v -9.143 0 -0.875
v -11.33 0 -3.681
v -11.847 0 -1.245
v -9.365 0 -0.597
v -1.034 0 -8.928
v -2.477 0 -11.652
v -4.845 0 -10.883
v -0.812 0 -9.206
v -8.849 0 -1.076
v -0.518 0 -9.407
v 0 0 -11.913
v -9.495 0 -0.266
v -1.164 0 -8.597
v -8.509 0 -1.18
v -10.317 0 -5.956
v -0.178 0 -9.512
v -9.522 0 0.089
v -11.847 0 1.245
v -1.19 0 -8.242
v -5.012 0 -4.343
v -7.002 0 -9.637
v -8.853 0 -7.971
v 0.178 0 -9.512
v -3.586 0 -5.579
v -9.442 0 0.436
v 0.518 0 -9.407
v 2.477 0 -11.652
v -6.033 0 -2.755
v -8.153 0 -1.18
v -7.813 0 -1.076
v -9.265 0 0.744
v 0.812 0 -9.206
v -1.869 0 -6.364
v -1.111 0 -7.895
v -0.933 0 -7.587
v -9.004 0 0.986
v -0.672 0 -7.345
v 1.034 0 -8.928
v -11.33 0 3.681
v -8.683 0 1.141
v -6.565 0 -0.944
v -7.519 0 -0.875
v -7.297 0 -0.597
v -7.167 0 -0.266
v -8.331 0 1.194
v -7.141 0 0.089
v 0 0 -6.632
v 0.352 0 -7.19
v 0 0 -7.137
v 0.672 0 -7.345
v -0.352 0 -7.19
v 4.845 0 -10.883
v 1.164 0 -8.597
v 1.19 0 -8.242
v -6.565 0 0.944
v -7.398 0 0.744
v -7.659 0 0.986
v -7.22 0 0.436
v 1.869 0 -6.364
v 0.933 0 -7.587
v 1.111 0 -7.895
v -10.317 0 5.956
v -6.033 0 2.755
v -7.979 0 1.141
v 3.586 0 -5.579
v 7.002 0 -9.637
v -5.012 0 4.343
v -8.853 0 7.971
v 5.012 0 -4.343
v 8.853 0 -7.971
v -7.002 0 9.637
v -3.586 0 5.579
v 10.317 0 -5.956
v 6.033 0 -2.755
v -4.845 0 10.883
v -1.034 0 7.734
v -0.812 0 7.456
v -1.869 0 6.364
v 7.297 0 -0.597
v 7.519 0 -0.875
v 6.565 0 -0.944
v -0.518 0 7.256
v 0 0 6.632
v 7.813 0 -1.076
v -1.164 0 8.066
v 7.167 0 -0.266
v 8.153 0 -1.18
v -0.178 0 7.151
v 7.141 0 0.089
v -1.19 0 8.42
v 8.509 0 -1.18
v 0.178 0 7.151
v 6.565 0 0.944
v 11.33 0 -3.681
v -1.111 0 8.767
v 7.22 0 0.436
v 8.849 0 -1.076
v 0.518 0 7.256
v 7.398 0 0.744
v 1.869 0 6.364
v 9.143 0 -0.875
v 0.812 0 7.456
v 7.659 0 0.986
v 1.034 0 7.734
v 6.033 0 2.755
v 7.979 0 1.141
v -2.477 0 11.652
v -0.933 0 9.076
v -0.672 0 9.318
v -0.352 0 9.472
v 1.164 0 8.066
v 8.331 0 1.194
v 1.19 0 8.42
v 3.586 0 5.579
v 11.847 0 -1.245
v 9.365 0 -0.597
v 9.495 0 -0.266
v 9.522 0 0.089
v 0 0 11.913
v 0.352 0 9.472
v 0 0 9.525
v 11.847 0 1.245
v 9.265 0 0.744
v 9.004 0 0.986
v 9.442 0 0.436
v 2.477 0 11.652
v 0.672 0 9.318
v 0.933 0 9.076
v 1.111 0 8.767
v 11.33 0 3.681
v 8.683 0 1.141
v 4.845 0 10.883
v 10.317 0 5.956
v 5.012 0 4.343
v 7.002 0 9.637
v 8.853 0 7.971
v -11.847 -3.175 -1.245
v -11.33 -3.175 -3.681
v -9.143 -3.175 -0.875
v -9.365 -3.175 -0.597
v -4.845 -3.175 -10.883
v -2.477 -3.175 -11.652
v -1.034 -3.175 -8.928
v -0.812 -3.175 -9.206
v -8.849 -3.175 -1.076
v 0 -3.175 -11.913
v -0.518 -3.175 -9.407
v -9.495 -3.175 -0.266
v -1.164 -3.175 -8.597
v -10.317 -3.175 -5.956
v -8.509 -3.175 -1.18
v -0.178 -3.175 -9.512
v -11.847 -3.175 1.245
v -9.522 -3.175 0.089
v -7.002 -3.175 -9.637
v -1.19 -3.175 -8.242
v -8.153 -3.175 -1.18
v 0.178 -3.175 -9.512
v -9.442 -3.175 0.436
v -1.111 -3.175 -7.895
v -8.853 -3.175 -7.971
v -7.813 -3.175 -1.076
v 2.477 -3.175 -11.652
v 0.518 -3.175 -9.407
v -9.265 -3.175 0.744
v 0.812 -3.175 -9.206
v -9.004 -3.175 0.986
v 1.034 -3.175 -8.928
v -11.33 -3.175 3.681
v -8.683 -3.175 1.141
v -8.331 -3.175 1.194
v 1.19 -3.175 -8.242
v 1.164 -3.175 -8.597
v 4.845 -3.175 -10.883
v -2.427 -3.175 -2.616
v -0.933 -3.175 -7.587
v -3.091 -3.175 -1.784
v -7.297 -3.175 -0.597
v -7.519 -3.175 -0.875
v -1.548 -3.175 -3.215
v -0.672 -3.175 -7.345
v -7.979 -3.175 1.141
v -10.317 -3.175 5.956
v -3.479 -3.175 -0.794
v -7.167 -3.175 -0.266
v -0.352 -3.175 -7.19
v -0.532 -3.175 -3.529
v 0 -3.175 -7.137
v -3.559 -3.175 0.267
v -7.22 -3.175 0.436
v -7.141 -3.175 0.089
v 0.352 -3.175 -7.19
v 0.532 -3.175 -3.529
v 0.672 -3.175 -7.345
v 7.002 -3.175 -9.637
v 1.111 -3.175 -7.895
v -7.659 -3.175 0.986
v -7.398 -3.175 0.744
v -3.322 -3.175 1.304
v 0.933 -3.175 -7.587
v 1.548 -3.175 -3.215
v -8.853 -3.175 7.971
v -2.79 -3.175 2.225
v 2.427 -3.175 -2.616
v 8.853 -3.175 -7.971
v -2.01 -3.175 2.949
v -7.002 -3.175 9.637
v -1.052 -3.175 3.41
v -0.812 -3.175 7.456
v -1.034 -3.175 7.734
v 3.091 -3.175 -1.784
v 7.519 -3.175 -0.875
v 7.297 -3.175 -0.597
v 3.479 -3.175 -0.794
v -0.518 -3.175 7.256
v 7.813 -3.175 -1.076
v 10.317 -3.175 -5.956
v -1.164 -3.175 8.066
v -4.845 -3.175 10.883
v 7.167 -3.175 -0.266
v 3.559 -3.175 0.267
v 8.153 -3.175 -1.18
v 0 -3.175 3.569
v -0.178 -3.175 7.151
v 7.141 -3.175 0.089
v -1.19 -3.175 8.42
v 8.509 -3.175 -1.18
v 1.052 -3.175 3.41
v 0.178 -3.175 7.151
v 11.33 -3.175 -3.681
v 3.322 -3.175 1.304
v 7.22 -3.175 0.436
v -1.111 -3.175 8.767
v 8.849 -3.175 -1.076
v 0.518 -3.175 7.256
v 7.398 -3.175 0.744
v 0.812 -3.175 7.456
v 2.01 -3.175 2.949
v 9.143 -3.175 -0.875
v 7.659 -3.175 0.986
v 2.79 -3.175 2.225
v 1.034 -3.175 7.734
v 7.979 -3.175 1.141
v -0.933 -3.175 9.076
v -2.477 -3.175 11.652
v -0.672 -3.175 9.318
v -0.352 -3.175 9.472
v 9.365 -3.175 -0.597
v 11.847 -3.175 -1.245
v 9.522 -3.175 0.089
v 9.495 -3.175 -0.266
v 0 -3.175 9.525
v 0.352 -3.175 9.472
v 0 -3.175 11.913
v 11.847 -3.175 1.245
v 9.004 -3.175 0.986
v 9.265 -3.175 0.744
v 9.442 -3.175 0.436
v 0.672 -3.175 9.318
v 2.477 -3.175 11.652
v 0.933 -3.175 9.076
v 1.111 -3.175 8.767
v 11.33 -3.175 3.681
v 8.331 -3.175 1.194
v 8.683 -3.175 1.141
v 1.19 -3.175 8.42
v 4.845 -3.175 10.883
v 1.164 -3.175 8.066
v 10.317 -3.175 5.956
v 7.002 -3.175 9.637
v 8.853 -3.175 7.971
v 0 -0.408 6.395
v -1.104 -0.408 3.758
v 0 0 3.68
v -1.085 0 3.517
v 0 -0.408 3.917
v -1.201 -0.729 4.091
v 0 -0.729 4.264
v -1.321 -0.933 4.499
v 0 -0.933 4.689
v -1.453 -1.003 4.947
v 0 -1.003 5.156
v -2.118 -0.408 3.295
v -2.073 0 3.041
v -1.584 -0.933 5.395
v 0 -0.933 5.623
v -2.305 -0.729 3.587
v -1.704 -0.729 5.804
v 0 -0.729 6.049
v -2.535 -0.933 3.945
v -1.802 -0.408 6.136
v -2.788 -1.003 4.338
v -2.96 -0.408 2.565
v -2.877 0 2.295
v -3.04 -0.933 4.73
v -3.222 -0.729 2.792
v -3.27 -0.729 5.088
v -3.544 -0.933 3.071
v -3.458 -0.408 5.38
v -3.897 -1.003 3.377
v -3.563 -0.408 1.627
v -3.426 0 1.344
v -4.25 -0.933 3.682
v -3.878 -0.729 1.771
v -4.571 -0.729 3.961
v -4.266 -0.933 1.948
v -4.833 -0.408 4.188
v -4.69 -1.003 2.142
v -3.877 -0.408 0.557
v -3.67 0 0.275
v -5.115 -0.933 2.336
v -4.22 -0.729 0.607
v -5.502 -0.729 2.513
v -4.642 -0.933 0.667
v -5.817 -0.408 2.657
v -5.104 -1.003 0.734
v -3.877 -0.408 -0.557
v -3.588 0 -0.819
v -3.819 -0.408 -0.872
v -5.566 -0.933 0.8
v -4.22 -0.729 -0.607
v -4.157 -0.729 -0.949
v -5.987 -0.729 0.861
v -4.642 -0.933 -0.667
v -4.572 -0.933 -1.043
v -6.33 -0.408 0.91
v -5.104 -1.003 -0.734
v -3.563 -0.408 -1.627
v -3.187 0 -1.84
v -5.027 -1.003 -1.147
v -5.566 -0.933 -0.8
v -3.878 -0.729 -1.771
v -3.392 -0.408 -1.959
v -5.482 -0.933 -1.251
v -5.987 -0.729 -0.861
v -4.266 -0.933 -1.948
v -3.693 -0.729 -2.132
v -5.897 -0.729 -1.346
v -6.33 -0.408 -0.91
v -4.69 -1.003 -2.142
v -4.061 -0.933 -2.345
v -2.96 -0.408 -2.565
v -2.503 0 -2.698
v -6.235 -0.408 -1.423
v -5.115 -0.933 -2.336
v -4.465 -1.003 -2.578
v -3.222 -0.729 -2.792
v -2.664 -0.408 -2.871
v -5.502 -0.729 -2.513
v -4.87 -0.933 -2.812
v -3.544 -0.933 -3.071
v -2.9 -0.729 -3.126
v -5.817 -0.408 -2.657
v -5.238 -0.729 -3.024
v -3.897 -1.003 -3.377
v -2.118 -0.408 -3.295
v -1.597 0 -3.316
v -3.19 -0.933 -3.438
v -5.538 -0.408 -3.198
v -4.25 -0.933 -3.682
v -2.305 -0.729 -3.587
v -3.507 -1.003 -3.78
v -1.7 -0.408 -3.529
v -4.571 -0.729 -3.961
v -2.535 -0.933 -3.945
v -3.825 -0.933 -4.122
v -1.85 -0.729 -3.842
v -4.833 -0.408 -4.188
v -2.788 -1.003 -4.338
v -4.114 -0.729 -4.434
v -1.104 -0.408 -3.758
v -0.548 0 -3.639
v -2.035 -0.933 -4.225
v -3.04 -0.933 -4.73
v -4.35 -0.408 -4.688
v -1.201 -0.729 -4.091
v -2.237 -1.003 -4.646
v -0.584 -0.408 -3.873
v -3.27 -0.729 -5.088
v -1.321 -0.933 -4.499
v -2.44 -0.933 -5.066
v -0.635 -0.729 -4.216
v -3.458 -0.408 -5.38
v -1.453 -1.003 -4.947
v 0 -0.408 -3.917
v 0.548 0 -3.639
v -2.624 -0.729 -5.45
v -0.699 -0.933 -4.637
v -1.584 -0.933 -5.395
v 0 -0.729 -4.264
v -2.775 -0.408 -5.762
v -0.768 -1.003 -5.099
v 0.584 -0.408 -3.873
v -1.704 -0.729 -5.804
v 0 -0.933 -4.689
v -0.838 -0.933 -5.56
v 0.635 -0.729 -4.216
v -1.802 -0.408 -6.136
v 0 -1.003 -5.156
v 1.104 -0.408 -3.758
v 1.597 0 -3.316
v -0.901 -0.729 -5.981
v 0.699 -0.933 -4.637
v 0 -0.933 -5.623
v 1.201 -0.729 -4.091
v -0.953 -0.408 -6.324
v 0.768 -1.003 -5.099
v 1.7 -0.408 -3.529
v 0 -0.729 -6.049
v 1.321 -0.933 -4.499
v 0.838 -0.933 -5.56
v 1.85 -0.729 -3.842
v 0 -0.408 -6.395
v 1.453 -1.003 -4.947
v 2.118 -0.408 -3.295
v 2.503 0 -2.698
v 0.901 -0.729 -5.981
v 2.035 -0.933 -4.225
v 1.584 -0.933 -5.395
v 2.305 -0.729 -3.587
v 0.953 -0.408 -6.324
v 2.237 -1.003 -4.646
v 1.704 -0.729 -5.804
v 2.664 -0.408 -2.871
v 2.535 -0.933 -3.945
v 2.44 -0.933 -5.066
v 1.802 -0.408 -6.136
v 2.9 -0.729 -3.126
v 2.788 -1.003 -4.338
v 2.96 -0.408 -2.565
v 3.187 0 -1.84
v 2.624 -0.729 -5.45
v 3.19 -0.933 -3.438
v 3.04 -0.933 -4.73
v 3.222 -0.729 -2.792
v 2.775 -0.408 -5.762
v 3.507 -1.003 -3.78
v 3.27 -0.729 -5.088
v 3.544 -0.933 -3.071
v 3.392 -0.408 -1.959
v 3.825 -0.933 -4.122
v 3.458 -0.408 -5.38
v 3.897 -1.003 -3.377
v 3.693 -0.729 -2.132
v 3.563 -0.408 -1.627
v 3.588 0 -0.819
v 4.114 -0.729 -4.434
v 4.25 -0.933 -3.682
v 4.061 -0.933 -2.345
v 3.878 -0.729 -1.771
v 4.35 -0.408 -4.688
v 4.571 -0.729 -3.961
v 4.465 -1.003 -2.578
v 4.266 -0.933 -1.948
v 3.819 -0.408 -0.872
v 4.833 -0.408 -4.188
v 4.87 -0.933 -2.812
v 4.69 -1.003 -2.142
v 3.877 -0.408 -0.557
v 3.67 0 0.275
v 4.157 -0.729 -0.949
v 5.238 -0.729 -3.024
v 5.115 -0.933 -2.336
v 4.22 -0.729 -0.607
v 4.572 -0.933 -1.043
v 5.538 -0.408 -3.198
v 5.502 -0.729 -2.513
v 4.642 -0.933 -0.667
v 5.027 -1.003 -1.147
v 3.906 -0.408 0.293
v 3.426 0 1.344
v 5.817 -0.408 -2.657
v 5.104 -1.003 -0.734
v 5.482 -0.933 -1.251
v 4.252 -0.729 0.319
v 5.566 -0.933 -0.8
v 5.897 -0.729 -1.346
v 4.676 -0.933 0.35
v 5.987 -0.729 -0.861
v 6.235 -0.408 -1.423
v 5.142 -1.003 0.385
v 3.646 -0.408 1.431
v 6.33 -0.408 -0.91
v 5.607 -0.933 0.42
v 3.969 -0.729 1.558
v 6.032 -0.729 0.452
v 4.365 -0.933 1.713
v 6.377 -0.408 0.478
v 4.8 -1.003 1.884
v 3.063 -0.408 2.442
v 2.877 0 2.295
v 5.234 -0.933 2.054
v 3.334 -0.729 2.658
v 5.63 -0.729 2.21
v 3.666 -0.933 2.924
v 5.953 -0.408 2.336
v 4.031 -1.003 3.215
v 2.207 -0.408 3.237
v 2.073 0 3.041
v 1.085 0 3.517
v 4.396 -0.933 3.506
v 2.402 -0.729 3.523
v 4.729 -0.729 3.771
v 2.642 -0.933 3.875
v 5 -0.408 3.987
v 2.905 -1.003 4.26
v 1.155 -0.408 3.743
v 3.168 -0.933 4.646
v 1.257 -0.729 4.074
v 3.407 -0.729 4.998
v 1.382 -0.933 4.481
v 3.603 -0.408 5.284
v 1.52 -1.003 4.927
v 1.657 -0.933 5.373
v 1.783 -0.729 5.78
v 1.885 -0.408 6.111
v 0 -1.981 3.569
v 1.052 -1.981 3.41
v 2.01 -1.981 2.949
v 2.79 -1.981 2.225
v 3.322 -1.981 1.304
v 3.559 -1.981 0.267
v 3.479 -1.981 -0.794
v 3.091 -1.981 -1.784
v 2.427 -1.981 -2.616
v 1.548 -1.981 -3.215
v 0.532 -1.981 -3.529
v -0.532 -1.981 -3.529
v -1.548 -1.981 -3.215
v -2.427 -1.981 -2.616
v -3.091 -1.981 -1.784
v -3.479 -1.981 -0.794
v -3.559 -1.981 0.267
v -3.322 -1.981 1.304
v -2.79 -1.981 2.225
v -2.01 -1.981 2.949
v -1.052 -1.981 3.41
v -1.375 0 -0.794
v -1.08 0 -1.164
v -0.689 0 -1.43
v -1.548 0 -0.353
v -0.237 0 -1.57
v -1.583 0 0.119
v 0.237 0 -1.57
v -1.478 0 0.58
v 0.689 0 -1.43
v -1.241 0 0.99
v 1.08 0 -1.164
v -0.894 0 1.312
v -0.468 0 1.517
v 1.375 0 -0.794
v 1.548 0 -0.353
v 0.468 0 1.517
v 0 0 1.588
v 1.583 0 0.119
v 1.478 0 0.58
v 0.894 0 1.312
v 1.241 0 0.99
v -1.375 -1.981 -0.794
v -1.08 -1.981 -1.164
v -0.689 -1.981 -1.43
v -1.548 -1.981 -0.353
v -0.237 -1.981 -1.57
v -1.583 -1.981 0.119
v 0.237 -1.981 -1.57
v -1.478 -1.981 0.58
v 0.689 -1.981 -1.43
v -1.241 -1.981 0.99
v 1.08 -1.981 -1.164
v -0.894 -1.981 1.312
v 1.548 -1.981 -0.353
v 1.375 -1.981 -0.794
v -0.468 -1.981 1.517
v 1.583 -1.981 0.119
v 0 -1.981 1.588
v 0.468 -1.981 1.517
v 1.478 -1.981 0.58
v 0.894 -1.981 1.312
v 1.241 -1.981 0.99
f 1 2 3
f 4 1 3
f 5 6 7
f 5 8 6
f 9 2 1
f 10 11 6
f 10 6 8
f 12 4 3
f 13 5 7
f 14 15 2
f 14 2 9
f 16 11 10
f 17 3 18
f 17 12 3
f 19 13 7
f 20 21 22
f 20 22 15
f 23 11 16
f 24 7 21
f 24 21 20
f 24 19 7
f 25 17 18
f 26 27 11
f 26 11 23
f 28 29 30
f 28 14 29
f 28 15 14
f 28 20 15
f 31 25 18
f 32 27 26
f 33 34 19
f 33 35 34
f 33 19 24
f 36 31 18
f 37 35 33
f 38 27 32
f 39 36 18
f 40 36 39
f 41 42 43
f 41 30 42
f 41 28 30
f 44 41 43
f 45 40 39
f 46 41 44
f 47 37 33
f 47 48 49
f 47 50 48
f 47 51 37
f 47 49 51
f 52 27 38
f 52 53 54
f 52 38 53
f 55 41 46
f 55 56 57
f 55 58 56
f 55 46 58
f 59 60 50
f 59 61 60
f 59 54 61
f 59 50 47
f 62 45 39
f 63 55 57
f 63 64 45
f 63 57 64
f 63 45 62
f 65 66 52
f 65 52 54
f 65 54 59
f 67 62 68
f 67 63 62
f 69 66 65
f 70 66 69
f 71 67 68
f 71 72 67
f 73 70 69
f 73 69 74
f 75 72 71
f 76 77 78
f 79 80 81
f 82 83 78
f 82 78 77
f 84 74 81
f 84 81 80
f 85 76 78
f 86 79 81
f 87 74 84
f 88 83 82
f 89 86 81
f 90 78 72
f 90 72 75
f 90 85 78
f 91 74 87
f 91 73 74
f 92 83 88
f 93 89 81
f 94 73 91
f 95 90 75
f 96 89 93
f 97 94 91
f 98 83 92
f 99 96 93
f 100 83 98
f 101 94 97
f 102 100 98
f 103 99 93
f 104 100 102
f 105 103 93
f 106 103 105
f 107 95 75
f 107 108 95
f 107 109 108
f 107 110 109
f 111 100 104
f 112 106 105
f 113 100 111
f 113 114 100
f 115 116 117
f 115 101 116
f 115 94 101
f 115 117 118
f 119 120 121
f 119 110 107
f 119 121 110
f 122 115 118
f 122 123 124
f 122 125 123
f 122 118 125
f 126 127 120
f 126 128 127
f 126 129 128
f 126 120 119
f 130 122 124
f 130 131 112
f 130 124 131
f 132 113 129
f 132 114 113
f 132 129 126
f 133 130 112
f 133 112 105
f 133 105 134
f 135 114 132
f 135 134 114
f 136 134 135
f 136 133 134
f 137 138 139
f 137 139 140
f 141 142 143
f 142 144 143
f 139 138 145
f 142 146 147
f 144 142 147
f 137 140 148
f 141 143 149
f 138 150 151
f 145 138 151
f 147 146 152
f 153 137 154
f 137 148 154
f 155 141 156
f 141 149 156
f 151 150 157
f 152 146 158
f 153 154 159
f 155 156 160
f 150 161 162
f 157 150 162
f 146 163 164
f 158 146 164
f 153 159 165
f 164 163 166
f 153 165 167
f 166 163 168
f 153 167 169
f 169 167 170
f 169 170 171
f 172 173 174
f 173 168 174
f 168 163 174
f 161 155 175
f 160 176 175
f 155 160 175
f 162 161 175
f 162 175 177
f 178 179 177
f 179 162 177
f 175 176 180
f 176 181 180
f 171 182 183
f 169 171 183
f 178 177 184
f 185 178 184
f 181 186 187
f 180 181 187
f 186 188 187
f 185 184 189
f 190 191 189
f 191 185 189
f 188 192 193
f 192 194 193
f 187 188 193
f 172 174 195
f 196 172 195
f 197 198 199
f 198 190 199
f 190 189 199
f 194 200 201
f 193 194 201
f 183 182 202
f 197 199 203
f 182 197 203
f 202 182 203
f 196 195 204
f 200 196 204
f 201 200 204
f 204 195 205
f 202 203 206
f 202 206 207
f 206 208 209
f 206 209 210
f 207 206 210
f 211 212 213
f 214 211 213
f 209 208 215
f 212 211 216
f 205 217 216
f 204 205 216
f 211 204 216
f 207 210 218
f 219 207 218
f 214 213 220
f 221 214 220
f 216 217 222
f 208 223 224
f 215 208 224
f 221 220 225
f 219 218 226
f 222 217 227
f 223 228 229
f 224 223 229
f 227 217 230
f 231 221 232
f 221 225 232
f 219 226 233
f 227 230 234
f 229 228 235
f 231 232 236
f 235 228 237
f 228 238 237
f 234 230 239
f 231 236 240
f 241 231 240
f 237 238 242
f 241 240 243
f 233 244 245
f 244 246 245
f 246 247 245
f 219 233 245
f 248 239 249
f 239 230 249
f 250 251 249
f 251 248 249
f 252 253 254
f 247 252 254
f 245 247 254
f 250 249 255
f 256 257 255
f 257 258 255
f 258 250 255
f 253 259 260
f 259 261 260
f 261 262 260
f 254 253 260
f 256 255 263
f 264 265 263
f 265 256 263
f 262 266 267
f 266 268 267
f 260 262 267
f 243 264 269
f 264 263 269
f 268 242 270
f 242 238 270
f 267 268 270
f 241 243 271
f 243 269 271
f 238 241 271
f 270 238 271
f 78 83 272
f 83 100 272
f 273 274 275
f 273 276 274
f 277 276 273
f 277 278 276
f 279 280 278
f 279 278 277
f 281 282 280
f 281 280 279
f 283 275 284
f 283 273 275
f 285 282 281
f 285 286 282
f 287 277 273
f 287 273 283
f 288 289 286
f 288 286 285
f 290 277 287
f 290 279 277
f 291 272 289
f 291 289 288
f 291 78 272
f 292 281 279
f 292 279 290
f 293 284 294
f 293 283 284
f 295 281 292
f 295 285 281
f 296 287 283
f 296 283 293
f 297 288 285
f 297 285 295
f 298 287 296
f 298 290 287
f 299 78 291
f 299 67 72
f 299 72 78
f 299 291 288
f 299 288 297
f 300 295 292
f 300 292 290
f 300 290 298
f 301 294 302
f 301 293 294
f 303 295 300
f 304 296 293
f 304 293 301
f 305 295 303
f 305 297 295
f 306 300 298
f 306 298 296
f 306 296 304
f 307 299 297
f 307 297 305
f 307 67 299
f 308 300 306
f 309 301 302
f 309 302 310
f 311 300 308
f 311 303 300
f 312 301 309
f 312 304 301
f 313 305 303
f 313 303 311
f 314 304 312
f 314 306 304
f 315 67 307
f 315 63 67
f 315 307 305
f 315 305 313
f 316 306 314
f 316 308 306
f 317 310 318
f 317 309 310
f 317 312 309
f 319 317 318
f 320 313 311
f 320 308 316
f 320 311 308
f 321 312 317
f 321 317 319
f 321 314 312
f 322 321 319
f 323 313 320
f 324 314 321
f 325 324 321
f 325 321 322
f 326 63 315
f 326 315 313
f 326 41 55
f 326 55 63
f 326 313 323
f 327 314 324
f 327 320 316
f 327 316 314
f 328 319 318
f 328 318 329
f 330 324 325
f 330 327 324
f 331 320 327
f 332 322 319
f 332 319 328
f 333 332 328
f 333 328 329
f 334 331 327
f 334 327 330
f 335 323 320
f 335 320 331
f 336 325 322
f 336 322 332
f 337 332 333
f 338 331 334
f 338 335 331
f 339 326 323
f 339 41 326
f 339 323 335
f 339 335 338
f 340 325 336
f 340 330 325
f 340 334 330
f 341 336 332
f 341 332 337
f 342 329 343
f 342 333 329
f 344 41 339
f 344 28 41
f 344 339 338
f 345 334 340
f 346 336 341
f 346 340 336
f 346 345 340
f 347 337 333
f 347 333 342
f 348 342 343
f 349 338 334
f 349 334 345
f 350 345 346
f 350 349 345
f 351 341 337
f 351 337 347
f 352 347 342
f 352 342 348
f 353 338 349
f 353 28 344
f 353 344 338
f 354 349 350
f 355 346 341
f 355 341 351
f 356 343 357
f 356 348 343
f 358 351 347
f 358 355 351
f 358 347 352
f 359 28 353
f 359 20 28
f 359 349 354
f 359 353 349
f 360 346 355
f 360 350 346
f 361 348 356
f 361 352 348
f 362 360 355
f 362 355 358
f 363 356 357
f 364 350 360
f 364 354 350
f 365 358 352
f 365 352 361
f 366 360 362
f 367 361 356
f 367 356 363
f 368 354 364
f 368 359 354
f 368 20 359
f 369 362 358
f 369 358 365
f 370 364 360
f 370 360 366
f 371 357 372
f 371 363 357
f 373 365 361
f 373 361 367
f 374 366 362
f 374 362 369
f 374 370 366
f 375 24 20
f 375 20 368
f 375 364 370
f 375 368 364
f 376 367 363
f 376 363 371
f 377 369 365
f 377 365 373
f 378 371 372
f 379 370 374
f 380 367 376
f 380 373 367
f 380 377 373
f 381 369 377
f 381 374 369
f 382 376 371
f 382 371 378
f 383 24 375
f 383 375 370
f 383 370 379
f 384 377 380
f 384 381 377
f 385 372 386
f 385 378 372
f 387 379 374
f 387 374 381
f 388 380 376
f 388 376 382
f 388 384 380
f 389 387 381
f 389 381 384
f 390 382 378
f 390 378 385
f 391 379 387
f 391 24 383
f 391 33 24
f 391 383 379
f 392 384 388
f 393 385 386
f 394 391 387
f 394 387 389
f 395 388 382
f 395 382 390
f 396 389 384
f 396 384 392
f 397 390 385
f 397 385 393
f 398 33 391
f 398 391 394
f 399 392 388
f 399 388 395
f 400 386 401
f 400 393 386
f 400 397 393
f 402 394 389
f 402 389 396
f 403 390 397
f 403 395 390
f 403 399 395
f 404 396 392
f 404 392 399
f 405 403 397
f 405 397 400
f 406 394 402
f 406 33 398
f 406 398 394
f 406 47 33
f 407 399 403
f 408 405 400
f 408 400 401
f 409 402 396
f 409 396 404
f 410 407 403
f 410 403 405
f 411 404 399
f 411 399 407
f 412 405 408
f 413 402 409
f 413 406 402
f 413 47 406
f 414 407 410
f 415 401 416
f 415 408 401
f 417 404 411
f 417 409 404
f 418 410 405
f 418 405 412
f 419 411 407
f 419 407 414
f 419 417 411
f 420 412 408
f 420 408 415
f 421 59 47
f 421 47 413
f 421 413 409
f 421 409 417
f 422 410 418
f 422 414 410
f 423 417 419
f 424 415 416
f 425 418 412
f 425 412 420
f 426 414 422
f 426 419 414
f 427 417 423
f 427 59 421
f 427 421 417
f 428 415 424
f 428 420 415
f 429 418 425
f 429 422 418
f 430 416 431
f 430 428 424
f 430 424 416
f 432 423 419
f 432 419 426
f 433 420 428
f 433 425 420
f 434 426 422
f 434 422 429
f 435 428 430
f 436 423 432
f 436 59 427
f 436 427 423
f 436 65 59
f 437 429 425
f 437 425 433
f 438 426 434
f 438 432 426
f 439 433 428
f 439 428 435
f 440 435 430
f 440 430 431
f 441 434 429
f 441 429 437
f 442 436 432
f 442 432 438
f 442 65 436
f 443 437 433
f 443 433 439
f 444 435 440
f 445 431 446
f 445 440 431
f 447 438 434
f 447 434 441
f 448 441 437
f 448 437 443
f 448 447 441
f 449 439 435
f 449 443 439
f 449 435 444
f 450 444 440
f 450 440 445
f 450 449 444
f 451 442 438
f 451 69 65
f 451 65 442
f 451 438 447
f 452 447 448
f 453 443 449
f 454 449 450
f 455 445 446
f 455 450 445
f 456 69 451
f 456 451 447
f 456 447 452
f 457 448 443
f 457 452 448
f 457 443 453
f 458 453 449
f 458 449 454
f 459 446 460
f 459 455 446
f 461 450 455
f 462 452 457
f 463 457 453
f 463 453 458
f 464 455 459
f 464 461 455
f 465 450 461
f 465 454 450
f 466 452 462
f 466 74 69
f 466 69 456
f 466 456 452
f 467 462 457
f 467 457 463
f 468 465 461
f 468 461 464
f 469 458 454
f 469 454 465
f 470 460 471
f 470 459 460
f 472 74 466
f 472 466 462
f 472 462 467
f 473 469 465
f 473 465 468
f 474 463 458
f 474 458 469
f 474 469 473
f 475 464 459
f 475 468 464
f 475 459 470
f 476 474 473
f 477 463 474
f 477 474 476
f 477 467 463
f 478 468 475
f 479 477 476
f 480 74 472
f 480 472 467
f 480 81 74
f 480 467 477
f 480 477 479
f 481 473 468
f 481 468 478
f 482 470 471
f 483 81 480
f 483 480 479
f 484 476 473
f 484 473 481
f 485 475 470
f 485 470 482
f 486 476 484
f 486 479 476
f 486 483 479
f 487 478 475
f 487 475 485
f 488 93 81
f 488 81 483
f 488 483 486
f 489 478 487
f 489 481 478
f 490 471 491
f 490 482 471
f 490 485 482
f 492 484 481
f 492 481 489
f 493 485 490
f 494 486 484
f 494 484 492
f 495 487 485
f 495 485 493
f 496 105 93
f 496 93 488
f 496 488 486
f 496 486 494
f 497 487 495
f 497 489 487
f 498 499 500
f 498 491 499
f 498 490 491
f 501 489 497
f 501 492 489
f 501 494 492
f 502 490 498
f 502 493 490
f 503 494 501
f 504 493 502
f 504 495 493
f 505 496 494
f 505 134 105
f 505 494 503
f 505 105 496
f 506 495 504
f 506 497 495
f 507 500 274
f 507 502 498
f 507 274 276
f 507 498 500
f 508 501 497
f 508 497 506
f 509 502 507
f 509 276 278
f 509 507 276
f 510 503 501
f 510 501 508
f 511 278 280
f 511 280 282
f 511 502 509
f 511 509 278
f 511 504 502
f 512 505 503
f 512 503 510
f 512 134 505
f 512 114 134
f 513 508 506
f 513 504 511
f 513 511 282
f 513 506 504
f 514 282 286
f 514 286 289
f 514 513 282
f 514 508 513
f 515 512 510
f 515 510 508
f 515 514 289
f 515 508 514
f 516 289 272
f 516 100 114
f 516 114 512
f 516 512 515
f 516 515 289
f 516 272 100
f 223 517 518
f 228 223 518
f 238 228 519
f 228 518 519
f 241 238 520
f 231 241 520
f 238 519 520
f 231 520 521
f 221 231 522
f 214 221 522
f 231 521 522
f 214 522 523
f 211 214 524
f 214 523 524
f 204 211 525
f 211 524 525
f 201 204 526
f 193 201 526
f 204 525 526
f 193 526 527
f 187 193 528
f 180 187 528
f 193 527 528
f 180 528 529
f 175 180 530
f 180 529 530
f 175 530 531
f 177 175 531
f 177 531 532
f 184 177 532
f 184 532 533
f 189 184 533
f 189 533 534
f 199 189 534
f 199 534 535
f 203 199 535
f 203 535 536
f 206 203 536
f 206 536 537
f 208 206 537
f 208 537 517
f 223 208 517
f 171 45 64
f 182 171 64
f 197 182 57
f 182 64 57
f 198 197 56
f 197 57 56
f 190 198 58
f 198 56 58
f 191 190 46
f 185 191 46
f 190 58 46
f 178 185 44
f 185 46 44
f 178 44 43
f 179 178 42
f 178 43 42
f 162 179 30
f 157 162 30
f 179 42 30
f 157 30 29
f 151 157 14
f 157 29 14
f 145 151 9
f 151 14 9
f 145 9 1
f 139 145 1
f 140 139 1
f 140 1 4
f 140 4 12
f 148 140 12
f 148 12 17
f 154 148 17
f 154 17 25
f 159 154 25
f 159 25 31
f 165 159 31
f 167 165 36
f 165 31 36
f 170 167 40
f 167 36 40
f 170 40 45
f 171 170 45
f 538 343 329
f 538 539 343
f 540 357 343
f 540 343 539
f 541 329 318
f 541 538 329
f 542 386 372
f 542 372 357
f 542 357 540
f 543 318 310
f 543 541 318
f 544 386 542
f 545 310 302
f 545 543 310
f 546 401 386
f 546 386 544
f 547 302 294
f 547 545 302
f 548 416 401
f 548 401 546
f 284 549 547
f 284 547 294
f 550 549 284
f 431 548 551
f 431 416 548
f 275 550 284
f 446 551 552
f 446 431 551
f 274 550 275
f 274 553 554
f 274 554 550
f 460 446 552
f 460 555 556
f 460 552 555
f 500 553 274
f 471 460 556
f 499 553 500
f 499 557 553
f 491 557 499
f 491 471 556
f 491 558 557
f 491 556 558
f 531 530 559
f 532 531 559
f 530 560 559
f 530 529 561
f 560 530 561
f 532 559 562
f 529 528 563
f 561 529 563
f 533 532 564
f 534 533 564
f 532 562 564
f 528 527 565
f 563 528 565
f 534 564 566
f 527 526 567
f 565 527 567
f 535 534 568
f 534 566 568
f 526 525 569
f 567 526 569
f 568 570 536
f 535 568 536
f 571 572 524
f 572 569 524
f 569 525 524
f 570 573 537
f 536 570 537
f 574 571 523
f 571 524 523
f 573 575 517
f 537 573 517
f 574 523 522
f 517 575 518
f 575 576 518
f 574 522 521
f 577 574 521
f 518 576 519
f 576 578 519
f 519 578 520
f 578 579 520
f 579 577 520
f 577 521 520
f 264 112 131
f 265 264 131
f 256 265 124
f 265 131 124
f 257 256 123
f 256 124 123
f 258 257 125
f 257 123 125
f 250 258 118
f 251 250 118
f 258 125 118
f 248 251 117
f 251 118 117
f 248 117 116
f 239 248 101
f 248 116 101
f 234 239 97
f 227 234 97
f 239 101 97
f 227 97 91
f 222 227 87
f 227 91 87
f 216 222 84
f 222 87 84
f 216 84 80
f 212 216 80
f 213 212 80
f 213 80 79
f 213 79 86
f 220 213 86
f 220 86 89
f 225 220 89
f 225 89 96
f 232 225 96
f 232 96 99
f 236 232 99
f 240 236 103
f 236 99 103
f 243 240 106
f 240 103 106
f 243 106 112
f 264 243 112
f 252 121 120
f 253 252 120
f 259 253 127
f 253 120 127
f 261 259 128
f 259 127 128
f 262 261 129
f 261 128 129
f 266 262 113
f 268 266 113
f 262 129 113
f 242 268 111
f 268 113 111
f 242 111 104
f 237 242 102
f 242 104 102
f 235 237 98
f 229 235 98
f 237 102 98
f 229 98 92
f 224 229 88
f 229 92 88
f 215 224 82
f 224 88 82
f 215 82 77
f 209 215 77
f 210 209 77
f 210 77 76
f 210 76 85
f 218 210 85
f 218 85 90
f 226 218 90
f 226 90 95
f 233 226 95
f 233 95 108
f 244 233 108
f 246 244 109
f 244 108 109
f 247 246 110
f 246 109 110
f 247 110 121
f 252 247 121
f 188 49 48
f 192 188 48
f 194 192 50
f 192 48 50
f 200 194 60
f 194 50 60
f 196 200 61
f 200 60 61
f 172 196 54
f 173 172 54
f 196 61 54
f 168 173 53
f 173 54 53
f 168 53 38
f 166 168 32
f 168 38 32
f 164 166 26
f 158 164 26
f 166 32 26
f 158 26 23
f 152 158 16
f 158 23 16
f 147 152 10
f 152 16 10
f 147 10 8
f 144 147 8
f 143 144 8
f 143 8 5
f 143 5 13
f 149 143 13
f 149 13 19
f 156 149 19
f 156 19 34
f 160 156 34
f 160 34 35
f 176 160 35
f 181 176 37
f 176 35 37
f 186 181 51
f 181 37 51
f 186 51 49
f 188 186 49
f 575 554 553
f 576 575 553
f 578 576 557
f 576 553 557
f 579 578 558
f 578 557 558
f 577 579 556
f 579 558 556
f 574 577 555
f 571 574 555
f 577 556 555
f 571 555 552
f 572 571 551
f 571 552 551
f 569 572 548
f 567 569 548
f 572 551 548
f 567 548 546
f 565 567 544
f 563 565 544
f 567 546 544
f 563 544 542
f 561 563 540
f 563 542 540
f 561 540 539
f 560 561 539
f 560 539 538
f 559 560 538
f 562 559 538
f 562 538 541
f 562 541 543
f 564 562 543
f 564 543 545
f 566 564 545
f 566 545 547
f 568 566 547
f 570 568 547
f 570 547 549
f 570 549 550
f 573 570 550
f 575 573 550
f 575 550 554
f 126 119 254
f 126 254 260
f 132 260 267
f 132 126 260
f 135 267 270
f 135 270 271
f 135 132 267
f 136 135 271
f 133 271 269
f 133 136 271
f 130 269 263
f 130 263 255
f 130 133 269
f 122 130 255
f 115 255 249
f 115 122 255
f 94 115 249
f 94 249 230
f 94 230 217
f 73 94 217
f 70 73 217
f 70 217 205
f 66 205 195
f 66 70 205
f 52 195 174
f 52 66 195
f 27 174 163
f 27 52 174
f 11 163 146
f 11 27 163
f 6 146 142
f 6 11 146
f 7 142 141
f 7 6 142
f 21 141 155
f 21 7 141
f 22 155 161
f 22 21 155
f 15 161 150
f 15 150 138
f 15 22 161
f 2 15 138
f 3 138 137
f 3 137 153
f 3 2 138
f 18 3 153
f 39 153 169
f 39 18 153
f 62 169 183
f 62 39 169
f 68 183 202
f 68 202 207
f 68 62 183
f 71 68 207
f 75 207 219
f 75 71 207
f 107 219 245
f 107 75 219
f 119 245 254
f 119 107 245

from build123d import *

# Parameters (mm, degrees)
SKETCH1_R          = 11.9126
SKETCH1_R_2        = 1.1938
SKETCH1_R_3        = 6.7437
SKETCH1_R_4        = 5.1562
SKETCH1_R_5        = 3.5687
SKETCH1_R_6        = 1.5875
EXTRUDE1_DEPTH     = 3.175
SKETCH3_R          = 1.5875
CUT_EXTRUDE1_START = -1.9812
SKETCH1_3_R        = 3.5687
SKETCH1_3_R_2      = 1.5875
CUT_EXTRUDE1_DEPTH = 3.175
SKETCH1_4_R        = 1.5875
CUT_EXTRUDE2_DEPTH = 3.175


with BuildPart() as part:
    # Sketch1 → Extrude1 (new body)
    with BuildSketch(Plane(origin=(0, 0, 0), x_dir=(1, 0, 0), z_dir=(0, 1, 0))):
        with Locations(Location((0, 0, 0), (0, 0, 270))):  # turned: the seam where the file's is
            Circle(SKETCH1_R)
        with Locations(Location((-8.3312, 0, 0), (0, 0, 270))):  # turned: the seam where the file's is
            Circle(SKETCH1_R_2, mode=Mode.SUBTRACT)
        with Locations(Location((0, -8.3312, 0), (0, 0, 270))):  # turned: the seam where the file's is
            Circle(SKETCH1_R_2, mode=Mode.SUBTRACT)
        with Locations(Location((8.3312, 0, 0), (0, 0, 270))):  # turned: the seam where the file's is
            Circle(SKETCH1_R_2, mode=Mode.SUBTRACT)
        with Locations(Location((0, 8.3312, 0), (0, 0, 270))):  # turned: the seam where the file's is
            Circle(SKETCH1_R_2, mode=Mode.SUBTRACT)
        Circle(SKETCH1_R_3, mode=Mode.SUBTRACT)
        Circle(SKETCH1_R_3)
        Circle(SKETCH1_R_4, mode=Mode.SUBTRACT)
        Circle(SKETCH1_R_4)
        Circle(SKETCH1_R_5, mode=Mode.SUBTRACT)
        Circle(SKETCH1_R_5)
        Circle(SKETCH1_R_6, mode=Mode.SUBTRACT)
        Circle(SKETCH1_R_6)
    extrude(amount=-EXTRUDE1_DEPTH)

    # Sketch3 → Cut-Revolve1 (revolve, cut)
    with BuildSketch(Plane.XY, mode=Mode.PRIVATE) as cut_revolve1_sk:
        with Locations((5.1562, 0.5842)):
            Circle(SKETCH3_R)
    revolve(cut_revolve1_sk.sketch.rotate(Axis((0, 5.548517396, 0), (0, -1, 0)), 90), axis=Axis((0, 5.548517396, 0), (0, -1, 0)), mode=Mode.SUBTRACT)  # turned: the seam where the file's is

    # Sketch1_3 → Cut-Extrude1 (cut)
    with BuildSketch(Plane(origin=(0, 0, 0), x_dir=(1, 0, 0), z_dir=(0, 1, 0)).offset(CUT_EXTRUDE1_START)):
        with Locations(Location((0, 0, 0), (0, 0, 270))):  # turned: the seam where the file's is
            Circle(SKETCH1_3_R)
        Circle(SKETCH1_3_R_2, mode=Mode.SUBTRACT)
        Circle(SKETCH1_3_R_2)
    extrude(amount=-CUT_EXTRUDE1_DEPTH, mode=Mode.SUBTRACT)

    # Sketch1_4 → Cut-Extrude2 (cut)
    with BuildSketch(Plane(origin=(0, 0, 0), x_dir=(1, 0, 0), z_dir=(0, 1, 0))):
        with Locations(Location((0, 0, 0), (0, 0, 270))):  # turned: the seam where the file's is
            Circle(SKETCH1_4_R)
    extrude(amount=-CUT_EXTRUDE2_DEPTH, mode=Mode.SUBTRACT)


solid = part.part
